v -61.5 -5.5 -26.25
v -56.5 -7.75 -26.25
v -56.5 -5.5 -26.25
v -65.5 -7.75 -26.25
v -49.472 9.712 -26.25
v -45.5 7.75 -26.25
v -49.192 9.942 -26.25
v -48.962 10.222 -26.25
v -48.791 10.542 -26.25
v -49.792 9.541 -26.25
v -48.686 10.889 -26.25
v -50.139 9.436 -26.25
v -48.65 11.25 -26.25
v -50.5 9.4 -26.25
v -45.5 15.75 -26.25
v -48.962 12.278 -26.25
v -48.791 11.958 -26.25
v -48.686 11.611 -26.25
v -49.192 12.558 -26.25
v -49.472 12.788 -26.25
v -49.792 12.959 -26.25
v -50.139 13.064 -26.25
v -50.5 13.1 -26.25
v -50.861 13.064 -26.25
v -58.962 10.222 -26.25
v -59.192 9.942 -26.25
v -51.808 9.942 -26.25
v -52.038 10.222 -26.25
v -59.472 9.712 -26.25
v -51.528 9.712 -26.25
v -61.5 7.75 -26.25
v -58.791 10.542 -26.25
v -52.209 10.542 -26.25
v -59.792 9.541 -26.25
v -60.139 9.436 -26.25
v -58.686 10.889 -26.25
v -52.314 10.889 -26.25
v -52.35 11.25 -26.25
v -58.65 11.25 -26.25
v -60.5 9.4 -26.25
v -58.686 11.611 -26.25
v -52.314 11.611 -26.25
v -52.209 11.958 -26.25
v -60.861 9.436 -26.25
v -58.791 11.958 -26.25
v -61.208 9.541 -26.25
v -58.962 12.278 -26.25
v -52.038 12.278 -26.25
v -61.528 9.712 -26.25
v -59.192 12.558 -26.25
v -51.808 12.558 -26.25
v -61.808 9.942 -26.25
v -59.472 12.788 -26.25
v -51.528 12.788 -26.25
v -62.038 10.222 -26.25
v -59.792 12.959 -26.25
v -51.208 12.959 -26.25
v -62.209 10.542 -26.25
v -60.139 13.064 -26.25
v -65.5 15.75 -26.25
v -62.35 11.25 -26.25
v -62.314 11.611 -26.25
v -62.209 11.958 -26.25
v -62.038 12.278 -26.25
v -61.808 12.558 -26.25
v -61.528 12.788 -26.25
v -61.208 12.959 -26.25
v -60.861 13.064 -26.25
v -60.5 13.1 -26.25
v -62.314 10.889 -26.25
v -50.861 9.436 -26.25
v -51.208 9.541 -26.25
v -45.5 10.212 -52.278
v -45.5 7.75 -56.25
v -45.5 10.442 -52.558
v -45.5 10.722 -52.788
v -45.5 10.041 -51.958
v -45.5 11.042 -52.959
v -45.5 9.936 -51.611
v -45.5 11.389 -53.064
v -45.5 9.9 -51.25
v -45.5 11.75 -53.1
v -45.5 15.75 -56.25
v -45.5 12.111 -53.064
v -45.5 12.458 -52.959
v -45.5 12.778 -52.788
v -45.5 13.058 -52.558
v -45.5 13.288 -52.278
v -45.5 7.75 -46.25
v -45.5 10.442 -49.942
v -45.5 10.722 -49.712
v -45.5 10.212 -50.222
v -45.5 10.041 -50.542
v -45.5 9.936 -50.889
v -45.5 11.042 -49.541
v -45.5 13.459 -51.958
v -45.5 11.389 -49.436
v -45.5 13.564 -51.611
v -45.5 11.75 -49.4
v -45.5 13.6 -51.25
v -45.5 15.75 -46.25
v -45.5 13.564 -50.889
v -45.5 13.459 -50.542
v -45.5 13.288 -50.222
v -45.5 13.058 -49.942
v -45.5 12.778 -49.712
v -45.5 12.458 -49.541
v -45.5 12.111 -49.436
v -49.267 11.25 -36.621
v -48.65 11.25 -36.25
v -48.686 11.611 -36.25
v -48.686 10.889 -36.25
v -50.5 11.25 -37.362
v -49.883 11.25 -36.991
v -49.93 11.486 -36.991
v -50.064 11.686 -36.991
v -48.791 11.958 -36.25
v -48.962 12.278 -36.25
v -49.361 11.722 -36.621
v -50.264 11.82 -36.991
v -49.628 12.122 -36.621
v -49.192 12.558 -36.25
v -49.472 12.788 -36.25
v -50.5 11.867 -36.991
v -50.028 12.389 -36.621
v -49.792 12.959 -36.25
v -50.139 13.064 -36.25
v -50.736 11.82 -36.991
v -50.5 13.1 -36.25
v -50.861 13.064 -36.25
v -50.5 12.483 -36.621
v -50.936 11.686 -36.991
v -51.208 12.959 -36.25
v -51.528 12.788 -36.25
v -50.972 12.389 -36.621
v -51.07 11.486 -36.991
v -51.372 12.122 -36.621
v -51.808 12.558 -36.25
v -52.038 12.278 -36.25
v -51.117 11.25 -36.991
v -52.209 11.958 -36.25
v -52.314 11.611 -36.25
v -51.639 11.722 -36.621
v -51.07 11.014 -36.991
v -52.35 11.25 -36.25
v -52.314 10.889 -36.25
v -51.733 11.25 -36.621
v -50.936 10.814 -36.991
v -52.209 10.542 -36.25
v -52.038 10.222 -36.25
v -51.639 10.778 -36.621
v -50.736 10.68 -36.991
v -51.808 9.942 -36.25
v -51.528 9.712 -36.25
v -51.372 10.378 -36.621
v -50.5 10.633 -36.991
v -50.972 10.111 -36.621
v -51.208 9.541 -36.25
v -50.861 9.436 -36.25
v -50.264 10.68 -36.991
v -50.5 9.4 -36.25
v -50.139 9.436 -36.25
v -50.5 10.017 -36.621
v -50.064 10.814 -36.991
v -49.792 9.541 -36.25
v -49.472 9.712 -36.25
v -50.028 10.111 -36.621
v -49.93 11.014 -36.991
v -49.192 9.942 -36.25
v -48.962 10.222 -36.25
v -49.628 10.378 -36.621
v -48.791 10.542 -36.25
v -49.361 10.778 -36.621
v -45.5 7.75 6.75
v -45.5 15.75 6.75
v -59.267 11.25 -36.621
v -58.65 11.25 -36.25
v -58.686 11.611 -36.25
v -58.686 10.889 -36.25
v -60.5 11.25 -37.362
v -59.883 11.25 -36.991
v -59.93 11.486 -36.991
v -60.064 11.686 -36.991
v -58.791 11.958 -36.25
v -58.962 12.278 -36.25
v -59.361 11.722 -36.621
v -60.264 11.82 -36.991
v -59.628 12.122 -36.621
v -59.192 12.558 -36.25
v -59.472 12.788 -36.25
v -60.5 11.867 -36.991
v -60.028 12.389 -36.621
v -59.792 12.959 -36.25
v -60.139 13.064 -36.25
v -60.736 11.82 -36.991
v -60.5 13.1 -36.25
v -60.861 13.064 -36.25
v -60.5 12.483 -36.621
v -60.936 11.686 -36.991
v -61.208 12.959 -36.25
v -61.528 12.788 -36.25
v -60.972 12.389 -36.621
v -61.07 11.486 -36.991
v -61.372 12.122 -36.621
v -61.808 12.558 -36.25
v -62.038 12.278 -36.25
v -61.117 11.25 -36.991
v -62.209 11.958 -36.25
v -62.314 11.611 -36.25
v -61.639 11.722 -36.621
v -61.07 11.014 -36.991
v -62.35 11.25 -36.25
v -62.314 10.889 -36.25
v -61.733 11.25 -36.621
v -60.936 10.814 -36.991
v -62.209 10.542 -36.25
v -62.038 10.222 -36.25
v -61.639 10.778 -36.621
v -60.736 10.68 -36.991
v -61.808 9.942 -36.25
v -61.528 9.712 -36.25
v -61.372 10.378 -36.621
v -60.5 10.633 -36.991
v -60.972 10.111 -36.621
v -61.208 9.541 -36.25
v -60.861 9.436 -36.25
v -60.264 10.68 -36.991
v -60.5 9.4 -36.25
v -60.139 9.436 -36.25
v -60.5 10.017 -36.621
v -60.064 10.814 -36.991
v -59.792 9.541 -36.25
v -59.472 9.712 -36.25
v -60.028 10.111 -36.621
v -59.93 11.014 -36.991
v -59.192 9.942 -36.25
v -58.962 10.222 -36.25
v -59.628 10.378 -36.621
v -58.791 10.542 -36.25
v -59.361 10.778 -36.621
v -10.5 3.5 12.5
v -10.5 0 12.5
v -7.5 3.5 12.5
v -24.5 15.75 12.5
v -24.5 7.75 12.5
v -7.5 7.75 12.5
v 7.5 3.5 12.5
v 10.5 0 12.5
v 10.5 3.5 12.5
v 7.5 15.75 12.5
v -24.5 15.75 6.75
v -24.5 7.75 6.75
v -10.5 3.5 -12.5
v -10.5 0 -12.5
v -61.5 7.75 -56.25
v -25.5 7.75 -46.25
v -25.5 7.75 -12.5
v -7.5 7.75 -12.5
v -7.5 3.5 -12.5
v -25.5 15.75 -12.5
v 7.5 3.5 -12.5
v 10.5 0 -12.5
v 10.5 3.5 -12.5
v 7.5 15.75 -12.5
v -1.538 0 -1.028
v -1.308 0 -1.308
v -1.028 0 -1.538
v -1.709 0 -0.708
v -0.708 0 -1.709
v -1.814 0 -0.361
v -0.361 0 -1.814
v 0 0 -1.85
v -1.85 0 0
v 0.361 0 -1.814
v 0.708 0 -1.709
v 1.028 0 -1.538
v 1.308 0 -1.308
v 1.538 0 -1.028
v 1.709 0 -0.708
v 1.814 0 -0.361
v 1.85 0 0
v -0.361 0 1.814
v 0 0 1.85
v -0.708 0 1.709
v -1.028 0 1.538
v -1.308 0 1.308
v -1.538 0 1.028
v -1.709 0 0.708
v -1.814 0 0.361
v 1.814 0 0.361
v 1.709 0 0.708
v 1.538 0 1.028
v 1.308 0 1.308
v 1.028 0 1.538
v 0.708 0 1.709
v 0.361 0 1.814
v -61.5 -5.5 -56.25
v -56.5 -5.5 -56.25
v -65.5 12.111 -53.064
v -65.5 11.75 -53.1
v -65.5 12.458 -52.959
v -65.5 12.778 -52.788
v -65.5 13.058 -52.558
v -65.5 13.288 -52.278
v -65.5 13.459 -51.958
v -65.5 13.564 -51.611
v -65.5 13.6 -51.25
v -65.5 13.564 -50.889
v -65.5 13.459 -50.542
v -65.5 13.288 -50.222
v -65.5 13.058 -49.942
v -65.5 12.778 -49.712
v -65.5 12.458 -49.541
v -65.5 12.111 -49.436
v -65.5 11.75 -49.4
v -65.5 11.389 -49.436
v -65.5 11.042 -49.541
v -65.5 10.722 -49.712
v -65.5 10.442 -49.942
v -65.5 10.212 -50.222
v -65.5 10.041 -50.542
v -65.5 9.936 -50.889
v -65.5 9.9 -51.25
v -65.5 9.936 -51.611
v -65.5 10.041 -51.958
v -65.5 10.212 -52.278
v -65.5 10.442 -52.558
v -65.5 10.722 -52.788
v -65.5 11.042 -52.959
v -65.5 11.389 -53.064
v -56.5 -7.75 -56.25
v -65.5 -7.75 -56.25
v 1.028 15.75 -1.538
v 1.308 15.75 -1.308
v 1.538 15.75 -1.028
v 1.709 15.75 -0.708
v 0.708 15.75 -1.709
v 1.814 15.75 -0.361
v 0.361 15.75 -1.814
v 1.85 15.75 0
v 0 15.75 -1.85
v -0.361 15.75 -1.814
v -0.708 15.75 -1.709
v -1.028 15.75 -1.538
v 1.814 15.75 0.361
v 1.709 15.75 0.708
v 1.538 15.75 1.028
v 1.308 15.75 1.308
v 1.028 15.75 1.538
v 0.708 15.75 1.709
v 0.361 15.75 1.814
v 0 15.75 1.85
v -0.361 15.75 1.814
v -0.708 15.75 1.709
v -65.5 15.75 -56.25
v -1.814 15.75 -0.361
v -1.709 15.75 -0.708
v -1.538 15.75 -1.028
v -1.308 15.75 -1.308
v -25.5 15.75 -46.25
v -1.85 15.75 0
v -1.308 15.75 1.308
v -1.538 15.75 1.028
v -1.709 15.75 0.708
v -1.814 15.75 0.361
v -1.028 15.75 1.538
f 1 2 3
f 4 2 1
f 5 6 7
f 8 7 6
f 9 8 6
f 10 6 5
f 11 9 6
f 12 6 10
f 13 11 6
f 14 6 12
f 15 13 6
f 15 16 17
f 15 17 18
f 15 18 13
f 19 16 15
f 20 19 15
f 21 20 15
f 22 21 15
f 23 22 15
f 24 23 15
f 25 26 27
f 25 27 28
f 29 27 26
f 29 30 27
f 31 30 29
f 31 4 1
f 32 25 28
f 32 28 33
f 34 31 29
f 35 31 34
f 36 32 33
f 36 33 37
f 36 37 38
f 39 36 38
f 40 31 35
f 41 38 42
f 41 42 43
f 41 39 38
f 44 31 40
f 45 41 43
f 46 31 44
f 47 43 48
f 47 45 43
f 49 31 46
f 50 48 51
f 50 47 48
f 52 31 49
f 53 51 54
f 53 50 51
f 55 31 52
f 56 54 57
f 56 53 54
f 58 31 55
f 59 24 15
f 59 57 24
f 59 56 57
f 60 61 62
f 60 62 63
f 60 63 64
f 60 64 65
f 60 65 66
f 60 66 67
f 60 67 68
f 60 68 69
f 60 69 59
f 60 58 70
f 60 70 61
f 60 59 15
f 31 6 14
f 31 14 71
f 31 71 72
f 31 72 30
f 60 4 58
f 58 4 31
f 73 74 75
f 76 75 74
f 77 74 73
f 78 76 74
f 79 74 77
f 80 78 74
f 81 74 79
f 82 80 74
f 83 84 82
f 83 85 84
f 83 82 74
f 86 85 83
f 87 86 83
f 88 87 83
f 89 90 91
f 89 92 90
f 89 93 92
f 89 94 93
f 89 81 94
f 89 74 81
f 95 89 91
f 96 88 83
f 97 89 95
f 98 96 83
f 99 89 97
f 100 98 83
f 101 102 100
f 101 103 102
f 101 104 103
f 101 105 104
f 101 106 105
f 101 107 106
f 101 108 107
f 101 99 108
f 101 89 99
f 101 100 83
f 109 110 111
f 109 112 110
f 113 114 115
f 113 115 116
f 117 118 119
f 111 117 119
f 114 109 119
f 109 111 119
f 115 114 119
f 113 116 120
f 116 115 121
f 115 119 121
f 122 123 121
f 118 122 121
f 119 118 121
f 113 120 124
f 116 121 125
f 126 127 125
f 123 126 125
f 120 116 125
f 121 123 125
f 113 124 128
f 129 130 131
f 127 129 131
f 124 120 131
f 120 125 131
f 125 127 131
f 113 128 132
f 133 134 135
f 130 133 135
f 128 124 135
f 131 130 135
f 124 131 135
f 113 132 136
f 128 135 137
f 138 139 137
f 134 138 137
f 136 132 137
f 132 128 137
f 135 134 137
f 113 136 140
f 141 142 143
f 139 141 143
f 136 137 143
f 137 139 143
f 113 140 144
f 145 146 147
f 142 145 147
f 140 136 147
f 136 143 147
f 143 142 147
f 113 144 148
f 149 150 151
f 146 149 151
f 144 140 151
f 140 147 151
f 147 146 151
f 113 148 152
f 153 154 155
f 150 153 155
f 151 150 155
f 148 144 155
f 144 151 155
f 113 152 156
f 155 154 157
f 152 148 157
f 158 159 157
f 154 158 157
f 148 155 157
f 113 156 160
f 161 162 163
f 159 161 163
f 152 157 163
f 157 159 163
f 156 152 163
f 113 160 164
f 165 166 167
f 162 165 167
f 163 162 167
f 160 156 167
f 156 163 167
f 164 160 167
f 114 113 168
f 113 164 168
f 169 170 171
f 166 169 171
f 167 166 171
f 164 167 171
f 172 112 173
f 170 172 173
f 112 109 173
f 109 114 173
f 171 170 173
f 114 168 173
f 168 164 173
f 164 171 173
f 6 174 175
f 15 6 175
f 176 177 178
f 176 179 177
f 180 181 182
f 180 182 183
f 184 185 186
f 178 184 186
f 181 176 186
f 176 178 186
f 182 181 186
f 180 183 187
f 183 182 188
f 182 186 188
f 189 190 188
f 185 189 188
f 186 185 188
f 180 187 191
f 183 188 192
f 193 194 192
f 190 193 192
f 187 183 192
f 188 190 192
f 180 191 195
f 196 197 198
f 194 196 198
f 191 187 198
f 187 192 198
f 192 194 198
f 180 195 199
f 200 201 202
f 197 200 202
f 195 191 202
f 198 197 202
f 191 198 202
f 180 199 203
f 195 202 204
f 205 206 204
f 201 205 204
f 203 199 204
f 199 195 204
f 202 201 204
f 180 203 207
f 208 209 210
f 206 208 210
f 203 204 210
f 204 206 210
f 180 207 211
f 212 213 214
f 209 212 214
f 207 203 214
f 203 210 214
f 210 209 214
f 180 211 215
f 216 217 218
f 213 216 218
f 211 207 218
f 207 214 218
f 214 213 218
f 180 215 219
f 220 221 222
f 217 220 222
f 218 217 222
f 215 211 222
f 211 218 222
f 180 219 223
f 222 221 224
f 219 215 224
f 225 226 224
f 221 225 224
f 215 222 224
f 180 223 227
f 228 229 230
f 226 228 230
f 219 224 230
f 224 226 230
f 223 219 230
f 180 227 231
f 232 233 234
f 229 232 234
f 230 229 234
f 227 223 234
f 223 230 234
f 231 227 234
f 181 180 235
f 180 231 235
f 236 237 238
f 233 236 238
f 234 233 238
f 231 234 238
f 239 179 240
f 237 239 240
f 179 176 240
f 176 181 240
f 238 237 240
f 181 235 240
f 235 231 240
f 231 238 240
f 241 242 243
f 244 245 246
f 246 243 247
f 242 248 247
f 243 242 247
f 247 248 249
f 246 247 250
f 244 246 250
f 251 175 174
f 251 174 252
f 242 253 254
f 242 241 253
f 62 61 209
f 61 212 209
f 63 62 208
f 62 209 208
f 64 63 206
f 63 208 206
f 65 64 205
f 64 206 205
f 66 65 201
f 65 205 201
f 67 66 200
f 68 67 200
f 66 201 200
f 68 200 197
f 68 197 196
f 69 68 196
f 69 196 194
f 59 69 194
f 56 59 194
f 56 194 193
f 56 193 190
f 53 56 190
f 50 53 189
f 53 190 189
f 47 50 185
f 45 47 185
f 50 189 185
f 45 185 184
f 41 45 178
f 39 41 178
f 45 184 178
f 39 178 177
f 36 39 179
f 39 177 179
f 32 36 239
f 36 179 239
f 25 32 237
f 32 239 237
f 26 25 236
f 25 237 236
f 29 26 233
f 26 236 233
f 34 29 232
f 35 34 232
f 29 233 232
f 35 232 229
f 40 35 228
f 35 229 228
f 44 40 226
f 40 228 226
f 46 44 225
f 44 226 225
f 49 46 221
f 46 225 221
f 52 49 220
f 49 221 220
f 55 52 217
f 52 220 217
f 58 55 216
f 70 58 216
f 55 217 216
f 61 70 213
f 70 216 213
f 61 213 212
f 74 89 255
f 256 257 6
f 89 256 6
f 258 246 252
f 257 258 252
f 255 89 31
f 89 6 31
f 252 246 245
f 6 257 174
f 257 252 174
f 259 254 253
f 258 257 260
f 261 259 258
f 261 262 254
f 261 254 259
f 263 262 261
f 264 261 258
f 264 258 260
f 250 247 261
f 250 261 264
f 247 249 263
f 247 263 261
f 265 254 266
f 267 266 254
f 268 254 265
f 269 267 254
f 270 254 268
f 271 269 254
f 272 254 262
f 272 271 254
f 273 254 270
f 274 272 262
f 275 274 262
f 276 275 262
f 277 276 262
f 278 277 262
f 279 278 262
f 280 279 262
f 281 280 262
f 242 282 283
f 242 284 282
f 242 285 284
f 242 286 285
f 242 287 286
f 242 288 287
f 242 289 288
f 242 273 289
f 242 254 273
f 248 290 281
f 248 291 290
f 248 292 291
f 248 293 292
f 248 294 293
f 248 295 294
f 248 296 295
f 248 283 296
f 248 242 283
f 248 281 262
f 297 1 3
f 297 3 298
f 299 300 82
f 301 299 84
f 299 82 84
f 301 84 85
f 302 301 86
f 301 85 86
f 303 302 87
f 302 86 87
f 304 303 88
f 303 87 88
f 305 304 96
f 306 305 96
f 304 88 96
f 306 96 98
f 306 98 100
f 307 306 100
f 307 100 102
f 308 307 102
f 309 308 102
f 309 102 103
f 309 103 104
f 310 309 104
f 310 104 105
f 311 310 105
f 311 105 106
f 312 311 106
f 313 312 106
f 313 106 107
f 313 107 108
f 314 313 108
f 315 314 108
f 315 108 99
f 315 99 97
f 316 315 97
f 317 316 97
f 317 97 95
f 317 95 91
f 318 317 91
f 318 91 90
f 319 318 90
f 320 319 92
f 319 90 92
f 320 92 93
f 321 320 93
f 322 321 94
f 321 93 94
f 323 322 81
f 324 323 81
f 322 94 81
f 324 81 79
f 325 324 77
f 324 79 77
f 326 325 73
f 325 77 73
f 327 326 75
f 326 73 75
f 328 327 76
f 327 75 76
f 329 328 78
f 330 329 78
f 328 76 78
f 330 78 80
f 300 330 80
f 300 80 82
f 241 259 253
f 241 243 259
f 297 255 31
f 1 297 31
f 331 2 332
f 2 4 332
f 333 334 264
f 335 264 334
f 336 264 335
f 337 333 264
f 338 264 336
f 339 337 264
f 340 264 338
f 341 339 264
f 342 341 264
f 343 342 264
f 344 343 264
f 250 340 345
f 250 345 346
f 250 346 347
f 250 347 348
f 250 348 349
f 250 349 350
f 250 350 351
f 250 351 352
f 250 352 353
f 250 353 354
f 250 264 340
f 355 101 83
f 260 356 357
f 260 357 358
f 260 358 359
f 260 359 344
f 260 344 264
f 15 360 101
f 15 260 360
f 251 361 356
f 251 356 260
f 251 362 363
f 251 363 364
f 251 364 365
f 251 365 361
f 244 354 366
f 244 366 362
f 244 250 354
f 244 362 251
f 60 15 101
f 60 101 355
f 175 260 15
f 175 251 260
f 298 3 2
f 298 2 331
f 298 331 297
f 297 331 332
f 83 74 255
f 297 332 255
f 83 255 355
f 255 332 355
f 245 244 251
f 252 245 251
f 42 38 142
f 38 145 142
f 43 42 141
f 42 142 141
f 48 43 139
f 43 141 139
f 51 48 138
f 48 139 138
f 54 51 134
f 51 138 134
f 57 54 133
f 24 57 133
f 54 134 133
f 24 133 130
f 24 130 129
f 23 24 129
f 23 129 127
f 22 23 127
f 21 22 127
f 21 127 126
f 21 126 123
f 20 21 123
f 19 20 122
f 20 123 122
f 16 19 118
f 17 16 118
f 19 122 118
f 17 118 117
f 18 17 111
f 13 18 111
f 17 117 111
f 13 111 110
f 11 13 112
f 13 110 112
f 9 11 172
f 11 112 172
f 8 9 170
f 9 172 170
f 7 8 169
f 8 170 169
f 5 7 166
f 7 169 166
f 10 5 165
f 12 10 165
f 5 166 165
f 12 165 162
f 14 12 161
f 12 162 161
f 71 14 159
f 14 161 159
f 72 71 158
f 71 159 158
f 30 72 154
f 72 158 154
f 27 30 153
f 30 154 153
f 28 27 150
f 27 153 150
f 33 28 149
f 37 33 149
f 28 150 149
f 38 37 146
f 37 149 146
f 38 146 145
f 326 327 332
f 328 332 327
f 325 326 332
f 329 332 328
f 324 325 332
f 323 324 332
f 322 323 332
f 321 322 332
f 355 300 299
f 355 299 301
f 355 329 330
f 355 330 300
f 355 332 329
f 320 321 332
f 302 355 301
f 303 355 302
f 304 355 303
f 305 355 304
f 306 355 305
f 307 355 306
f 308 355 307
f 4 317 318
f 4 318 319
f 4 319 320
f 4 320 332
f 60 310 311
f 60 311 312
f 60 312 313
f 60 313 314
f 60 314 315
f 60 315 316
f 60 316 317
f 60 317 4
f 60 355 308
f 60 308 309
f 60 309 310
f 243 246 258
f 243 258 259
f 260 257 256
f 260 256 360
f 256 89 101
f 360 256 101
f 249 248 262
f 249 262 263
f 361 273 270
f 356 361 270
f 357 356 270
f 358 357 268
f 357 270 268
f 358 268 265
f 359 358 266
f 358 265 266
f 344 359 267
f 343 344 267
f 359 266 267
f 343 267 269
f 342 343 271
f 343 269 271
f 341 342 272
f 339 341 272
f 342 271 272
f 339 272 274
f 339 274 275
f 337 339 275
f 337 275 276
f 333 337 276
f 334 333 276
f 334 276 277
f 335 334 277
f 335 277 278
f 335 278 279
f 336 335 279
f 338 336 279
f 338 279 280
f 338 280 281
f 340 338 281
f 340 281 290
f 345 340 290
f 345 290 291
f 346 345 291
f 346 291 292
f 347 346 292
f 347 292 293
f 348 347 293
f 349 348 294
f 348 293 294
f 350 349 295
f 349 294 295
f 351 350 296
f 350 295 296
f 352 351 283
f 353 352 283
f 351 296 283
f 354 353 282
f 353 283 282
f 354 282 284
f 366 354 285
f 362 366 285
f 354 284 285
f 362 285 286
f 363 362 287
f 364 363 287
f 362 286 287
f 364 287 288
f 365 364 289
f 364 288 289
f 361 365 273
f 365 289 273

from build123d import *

# Parameters (mm, degrees)
BOSS_EXTRUDE1_DEPTH            = 12.5
SKETCH2_W                      = 25
SKETCH2_H                      = 8
BOSS_EXTRUDE2_DEPTH            = 38
SKETCH7_W                      = 20
SKETCH7_H                      = 8
BOSS_EXTRUDE3_DEPTH            = 33.75
SKETCH10_W                     = 20
SKETCH10_H                     = 8
BOSS_EXTRUDE4_DEPTH            = 20
SKETCH11_W                     = 20
SKETCH11_H                     = 8
BOSS_EXTRUDE5_DEPTH            = 10
F_3_7_3_7_DIAMETER_HOLE2_D     = 3.7
F_3_7_3_7_DIAMETER_HOLE2_DEPTH = 10
F_3_7_3_7_DIAMETER_HOLE2_TIP   = 1.111592145
F_3_7_3_7_DIAMETER_HOLE1_D     = 3.7
F_3_7_3_7_DIAMETER_HOLE3_D     = 3.7
SKETCH12_W                     = 21
SKETCH12_H                     = 5.75
CUT_EXTRUDE1_DEPTH             = 88.763175649
SKETCH14_W                     = 4
SKETCH14_H                     = 30
BOSS_EXTRUDE7_DEPTH            = 15.5
SKETCH15_W                     = 30
SKETCH15_H                     = 2.25
BOSS_EXTRUDE8_DEPTH            = 5


with BuildPart() as part:
    # Sketch1 → Boss-Extrude1 (new, symmetric)
    with BuildSketch(Plane.XY):
        Polygon((-10.5, 0), (10.5, 0), (10.5, 3.5), (7.5, 3.5), (7.5, 15.75), (-7.5, 15.75), (-7.5, 3.5), (-10.5, 3.5), align=None)
    extrude(amount=BOSS_EXTRUDE1_DEPTH, both=True)

    # Sketch2 → Boss-Extrude2 (add)
    with BuildSketch(Plane.ZY.offset(7.5)):
        with Locations((0, 11.75)):
            Rectangle(SKETCH2_W, SKETCH2_H)
    extrude(amount=BOSS_EXTRUDE2_DEPTH)

    # Sketch7 → Boss-Extrude3 (add)
    with BuildSketch(Plane(origin=(0, 0, -12.5), x_dir=(-1, 0, 0), z_dir=(0, 0, -1))):
        with Locations((35.5, 11.75)):
            Rectangle(SKETCH7_W, SKETCH7_H)
    extrude(amount=BOSS_EXTRUDE3_DEPTH)

    # Sketch10 → Boss-Extrude4 (add)
    with BuildSketch(Plane.ZY.offset(45.5)):
        with Locations((-36.25, 11.75)):
            Rectangle(SKETCH10_W, SKETCH10_H)
    extrude(amount=BOSS_EXTRUDE4_DEPTH)

    # Sketch11 → Boss-Extrude5 (add)
    with BuildSketch(Plane(origin=(0, 0, -46.25), x_dir=(-1, 0, 0), z_dir=(0, 0, -1))):
        with Locations((55.5, 11.75)):
            Rectangle(SKETCH11_W, SKETCH11_H)
    extrude(amount=BOSS_EXTRUDE5_DEPTH)

    # Ø3.7 (3.7) Diameter Hole2
    with Locations(Plane.XY.offset(-26.25)):
        with Locations((-60.5, 11.25), (-50.5, 11.25)):
            Hole(F_3_7_3_7_DIAMETER_HOLE2_D / 2, depth=F_3_7_3_7_DIAMETER_HOLE2_DEPTH)
            with Locations((0, 0, -(F_3_7_3_7_DIAMETER_HOLE2_DEPTH + F_3_7_3_7_DIAMETER_HOLE2_TIP / 2))):  # 118° drill point
                Cone(0, F_3_7_3_7_DIAMETER_HOLE2_D / 2, F_3_7_3_7_DIAMETER_HOLE2_TIP, mode=Mode.SUBTRACT)

    # Ø3.7 (3.7) Diameter Hole1 (through all)
    with Locations(Plane.ZY.offset(65.5)):
        with Locations((-51.25, 11.75)):
            Hole(F_3_7_3_7_DIAMETER_HOLE1_D / 2)

    # Ø3.7 (3.7) Diameter Hole3 (through all)
    with Locations(Plane(origin=(0, 15.75, 0), x_dir=(1, 0, 0), z_dir=(0, 1, 0))):
        with Locations((0, 0)):
            Hole(F_3_7_3_7_DIAMETER_HOLE3_D / 2)

    # Sketch12 → Cut-Extrude1 (cut, through all)
    with BuildSketch(Plane(origin=(0, 15.75, 0), x_dir=(1, 0, 0), z_dir=(0, 1, 0))):
        with Locations((-35, -9.625)):
            Rectangle(SKETCH12_W, SKETCH12_H)
    extrude(amount=-CUT_EXTRUDE1_DEPTH, mode=Mode.SUBTRACT)

    # Sketch14 → Boss-Extrude7 (add)
    with BuildSketch(Plane.XZ.offset(-7.75)):
        with Locations((-63.5, -41.25)):
            Rectangle(SKETCH14_W, SKETCH14_H)
    extrude(amount=BOSS_EXTRUDE7_DEPTH)

    # Sketch15 → Boss-Extrude8 (add)
    with BuildSketch(Plane(origin=(-61.5, 0, 0), x_dir=(0, 0, -1), z_dir=(1, 0, 0))):
        with Locations((41.25, -6.625)):
            Rectangle(SKETCH15_W, SKETCH15_H)
    extrude(amount=BOSS_EXTRUDE8_DEPTH)


solid = part.part
